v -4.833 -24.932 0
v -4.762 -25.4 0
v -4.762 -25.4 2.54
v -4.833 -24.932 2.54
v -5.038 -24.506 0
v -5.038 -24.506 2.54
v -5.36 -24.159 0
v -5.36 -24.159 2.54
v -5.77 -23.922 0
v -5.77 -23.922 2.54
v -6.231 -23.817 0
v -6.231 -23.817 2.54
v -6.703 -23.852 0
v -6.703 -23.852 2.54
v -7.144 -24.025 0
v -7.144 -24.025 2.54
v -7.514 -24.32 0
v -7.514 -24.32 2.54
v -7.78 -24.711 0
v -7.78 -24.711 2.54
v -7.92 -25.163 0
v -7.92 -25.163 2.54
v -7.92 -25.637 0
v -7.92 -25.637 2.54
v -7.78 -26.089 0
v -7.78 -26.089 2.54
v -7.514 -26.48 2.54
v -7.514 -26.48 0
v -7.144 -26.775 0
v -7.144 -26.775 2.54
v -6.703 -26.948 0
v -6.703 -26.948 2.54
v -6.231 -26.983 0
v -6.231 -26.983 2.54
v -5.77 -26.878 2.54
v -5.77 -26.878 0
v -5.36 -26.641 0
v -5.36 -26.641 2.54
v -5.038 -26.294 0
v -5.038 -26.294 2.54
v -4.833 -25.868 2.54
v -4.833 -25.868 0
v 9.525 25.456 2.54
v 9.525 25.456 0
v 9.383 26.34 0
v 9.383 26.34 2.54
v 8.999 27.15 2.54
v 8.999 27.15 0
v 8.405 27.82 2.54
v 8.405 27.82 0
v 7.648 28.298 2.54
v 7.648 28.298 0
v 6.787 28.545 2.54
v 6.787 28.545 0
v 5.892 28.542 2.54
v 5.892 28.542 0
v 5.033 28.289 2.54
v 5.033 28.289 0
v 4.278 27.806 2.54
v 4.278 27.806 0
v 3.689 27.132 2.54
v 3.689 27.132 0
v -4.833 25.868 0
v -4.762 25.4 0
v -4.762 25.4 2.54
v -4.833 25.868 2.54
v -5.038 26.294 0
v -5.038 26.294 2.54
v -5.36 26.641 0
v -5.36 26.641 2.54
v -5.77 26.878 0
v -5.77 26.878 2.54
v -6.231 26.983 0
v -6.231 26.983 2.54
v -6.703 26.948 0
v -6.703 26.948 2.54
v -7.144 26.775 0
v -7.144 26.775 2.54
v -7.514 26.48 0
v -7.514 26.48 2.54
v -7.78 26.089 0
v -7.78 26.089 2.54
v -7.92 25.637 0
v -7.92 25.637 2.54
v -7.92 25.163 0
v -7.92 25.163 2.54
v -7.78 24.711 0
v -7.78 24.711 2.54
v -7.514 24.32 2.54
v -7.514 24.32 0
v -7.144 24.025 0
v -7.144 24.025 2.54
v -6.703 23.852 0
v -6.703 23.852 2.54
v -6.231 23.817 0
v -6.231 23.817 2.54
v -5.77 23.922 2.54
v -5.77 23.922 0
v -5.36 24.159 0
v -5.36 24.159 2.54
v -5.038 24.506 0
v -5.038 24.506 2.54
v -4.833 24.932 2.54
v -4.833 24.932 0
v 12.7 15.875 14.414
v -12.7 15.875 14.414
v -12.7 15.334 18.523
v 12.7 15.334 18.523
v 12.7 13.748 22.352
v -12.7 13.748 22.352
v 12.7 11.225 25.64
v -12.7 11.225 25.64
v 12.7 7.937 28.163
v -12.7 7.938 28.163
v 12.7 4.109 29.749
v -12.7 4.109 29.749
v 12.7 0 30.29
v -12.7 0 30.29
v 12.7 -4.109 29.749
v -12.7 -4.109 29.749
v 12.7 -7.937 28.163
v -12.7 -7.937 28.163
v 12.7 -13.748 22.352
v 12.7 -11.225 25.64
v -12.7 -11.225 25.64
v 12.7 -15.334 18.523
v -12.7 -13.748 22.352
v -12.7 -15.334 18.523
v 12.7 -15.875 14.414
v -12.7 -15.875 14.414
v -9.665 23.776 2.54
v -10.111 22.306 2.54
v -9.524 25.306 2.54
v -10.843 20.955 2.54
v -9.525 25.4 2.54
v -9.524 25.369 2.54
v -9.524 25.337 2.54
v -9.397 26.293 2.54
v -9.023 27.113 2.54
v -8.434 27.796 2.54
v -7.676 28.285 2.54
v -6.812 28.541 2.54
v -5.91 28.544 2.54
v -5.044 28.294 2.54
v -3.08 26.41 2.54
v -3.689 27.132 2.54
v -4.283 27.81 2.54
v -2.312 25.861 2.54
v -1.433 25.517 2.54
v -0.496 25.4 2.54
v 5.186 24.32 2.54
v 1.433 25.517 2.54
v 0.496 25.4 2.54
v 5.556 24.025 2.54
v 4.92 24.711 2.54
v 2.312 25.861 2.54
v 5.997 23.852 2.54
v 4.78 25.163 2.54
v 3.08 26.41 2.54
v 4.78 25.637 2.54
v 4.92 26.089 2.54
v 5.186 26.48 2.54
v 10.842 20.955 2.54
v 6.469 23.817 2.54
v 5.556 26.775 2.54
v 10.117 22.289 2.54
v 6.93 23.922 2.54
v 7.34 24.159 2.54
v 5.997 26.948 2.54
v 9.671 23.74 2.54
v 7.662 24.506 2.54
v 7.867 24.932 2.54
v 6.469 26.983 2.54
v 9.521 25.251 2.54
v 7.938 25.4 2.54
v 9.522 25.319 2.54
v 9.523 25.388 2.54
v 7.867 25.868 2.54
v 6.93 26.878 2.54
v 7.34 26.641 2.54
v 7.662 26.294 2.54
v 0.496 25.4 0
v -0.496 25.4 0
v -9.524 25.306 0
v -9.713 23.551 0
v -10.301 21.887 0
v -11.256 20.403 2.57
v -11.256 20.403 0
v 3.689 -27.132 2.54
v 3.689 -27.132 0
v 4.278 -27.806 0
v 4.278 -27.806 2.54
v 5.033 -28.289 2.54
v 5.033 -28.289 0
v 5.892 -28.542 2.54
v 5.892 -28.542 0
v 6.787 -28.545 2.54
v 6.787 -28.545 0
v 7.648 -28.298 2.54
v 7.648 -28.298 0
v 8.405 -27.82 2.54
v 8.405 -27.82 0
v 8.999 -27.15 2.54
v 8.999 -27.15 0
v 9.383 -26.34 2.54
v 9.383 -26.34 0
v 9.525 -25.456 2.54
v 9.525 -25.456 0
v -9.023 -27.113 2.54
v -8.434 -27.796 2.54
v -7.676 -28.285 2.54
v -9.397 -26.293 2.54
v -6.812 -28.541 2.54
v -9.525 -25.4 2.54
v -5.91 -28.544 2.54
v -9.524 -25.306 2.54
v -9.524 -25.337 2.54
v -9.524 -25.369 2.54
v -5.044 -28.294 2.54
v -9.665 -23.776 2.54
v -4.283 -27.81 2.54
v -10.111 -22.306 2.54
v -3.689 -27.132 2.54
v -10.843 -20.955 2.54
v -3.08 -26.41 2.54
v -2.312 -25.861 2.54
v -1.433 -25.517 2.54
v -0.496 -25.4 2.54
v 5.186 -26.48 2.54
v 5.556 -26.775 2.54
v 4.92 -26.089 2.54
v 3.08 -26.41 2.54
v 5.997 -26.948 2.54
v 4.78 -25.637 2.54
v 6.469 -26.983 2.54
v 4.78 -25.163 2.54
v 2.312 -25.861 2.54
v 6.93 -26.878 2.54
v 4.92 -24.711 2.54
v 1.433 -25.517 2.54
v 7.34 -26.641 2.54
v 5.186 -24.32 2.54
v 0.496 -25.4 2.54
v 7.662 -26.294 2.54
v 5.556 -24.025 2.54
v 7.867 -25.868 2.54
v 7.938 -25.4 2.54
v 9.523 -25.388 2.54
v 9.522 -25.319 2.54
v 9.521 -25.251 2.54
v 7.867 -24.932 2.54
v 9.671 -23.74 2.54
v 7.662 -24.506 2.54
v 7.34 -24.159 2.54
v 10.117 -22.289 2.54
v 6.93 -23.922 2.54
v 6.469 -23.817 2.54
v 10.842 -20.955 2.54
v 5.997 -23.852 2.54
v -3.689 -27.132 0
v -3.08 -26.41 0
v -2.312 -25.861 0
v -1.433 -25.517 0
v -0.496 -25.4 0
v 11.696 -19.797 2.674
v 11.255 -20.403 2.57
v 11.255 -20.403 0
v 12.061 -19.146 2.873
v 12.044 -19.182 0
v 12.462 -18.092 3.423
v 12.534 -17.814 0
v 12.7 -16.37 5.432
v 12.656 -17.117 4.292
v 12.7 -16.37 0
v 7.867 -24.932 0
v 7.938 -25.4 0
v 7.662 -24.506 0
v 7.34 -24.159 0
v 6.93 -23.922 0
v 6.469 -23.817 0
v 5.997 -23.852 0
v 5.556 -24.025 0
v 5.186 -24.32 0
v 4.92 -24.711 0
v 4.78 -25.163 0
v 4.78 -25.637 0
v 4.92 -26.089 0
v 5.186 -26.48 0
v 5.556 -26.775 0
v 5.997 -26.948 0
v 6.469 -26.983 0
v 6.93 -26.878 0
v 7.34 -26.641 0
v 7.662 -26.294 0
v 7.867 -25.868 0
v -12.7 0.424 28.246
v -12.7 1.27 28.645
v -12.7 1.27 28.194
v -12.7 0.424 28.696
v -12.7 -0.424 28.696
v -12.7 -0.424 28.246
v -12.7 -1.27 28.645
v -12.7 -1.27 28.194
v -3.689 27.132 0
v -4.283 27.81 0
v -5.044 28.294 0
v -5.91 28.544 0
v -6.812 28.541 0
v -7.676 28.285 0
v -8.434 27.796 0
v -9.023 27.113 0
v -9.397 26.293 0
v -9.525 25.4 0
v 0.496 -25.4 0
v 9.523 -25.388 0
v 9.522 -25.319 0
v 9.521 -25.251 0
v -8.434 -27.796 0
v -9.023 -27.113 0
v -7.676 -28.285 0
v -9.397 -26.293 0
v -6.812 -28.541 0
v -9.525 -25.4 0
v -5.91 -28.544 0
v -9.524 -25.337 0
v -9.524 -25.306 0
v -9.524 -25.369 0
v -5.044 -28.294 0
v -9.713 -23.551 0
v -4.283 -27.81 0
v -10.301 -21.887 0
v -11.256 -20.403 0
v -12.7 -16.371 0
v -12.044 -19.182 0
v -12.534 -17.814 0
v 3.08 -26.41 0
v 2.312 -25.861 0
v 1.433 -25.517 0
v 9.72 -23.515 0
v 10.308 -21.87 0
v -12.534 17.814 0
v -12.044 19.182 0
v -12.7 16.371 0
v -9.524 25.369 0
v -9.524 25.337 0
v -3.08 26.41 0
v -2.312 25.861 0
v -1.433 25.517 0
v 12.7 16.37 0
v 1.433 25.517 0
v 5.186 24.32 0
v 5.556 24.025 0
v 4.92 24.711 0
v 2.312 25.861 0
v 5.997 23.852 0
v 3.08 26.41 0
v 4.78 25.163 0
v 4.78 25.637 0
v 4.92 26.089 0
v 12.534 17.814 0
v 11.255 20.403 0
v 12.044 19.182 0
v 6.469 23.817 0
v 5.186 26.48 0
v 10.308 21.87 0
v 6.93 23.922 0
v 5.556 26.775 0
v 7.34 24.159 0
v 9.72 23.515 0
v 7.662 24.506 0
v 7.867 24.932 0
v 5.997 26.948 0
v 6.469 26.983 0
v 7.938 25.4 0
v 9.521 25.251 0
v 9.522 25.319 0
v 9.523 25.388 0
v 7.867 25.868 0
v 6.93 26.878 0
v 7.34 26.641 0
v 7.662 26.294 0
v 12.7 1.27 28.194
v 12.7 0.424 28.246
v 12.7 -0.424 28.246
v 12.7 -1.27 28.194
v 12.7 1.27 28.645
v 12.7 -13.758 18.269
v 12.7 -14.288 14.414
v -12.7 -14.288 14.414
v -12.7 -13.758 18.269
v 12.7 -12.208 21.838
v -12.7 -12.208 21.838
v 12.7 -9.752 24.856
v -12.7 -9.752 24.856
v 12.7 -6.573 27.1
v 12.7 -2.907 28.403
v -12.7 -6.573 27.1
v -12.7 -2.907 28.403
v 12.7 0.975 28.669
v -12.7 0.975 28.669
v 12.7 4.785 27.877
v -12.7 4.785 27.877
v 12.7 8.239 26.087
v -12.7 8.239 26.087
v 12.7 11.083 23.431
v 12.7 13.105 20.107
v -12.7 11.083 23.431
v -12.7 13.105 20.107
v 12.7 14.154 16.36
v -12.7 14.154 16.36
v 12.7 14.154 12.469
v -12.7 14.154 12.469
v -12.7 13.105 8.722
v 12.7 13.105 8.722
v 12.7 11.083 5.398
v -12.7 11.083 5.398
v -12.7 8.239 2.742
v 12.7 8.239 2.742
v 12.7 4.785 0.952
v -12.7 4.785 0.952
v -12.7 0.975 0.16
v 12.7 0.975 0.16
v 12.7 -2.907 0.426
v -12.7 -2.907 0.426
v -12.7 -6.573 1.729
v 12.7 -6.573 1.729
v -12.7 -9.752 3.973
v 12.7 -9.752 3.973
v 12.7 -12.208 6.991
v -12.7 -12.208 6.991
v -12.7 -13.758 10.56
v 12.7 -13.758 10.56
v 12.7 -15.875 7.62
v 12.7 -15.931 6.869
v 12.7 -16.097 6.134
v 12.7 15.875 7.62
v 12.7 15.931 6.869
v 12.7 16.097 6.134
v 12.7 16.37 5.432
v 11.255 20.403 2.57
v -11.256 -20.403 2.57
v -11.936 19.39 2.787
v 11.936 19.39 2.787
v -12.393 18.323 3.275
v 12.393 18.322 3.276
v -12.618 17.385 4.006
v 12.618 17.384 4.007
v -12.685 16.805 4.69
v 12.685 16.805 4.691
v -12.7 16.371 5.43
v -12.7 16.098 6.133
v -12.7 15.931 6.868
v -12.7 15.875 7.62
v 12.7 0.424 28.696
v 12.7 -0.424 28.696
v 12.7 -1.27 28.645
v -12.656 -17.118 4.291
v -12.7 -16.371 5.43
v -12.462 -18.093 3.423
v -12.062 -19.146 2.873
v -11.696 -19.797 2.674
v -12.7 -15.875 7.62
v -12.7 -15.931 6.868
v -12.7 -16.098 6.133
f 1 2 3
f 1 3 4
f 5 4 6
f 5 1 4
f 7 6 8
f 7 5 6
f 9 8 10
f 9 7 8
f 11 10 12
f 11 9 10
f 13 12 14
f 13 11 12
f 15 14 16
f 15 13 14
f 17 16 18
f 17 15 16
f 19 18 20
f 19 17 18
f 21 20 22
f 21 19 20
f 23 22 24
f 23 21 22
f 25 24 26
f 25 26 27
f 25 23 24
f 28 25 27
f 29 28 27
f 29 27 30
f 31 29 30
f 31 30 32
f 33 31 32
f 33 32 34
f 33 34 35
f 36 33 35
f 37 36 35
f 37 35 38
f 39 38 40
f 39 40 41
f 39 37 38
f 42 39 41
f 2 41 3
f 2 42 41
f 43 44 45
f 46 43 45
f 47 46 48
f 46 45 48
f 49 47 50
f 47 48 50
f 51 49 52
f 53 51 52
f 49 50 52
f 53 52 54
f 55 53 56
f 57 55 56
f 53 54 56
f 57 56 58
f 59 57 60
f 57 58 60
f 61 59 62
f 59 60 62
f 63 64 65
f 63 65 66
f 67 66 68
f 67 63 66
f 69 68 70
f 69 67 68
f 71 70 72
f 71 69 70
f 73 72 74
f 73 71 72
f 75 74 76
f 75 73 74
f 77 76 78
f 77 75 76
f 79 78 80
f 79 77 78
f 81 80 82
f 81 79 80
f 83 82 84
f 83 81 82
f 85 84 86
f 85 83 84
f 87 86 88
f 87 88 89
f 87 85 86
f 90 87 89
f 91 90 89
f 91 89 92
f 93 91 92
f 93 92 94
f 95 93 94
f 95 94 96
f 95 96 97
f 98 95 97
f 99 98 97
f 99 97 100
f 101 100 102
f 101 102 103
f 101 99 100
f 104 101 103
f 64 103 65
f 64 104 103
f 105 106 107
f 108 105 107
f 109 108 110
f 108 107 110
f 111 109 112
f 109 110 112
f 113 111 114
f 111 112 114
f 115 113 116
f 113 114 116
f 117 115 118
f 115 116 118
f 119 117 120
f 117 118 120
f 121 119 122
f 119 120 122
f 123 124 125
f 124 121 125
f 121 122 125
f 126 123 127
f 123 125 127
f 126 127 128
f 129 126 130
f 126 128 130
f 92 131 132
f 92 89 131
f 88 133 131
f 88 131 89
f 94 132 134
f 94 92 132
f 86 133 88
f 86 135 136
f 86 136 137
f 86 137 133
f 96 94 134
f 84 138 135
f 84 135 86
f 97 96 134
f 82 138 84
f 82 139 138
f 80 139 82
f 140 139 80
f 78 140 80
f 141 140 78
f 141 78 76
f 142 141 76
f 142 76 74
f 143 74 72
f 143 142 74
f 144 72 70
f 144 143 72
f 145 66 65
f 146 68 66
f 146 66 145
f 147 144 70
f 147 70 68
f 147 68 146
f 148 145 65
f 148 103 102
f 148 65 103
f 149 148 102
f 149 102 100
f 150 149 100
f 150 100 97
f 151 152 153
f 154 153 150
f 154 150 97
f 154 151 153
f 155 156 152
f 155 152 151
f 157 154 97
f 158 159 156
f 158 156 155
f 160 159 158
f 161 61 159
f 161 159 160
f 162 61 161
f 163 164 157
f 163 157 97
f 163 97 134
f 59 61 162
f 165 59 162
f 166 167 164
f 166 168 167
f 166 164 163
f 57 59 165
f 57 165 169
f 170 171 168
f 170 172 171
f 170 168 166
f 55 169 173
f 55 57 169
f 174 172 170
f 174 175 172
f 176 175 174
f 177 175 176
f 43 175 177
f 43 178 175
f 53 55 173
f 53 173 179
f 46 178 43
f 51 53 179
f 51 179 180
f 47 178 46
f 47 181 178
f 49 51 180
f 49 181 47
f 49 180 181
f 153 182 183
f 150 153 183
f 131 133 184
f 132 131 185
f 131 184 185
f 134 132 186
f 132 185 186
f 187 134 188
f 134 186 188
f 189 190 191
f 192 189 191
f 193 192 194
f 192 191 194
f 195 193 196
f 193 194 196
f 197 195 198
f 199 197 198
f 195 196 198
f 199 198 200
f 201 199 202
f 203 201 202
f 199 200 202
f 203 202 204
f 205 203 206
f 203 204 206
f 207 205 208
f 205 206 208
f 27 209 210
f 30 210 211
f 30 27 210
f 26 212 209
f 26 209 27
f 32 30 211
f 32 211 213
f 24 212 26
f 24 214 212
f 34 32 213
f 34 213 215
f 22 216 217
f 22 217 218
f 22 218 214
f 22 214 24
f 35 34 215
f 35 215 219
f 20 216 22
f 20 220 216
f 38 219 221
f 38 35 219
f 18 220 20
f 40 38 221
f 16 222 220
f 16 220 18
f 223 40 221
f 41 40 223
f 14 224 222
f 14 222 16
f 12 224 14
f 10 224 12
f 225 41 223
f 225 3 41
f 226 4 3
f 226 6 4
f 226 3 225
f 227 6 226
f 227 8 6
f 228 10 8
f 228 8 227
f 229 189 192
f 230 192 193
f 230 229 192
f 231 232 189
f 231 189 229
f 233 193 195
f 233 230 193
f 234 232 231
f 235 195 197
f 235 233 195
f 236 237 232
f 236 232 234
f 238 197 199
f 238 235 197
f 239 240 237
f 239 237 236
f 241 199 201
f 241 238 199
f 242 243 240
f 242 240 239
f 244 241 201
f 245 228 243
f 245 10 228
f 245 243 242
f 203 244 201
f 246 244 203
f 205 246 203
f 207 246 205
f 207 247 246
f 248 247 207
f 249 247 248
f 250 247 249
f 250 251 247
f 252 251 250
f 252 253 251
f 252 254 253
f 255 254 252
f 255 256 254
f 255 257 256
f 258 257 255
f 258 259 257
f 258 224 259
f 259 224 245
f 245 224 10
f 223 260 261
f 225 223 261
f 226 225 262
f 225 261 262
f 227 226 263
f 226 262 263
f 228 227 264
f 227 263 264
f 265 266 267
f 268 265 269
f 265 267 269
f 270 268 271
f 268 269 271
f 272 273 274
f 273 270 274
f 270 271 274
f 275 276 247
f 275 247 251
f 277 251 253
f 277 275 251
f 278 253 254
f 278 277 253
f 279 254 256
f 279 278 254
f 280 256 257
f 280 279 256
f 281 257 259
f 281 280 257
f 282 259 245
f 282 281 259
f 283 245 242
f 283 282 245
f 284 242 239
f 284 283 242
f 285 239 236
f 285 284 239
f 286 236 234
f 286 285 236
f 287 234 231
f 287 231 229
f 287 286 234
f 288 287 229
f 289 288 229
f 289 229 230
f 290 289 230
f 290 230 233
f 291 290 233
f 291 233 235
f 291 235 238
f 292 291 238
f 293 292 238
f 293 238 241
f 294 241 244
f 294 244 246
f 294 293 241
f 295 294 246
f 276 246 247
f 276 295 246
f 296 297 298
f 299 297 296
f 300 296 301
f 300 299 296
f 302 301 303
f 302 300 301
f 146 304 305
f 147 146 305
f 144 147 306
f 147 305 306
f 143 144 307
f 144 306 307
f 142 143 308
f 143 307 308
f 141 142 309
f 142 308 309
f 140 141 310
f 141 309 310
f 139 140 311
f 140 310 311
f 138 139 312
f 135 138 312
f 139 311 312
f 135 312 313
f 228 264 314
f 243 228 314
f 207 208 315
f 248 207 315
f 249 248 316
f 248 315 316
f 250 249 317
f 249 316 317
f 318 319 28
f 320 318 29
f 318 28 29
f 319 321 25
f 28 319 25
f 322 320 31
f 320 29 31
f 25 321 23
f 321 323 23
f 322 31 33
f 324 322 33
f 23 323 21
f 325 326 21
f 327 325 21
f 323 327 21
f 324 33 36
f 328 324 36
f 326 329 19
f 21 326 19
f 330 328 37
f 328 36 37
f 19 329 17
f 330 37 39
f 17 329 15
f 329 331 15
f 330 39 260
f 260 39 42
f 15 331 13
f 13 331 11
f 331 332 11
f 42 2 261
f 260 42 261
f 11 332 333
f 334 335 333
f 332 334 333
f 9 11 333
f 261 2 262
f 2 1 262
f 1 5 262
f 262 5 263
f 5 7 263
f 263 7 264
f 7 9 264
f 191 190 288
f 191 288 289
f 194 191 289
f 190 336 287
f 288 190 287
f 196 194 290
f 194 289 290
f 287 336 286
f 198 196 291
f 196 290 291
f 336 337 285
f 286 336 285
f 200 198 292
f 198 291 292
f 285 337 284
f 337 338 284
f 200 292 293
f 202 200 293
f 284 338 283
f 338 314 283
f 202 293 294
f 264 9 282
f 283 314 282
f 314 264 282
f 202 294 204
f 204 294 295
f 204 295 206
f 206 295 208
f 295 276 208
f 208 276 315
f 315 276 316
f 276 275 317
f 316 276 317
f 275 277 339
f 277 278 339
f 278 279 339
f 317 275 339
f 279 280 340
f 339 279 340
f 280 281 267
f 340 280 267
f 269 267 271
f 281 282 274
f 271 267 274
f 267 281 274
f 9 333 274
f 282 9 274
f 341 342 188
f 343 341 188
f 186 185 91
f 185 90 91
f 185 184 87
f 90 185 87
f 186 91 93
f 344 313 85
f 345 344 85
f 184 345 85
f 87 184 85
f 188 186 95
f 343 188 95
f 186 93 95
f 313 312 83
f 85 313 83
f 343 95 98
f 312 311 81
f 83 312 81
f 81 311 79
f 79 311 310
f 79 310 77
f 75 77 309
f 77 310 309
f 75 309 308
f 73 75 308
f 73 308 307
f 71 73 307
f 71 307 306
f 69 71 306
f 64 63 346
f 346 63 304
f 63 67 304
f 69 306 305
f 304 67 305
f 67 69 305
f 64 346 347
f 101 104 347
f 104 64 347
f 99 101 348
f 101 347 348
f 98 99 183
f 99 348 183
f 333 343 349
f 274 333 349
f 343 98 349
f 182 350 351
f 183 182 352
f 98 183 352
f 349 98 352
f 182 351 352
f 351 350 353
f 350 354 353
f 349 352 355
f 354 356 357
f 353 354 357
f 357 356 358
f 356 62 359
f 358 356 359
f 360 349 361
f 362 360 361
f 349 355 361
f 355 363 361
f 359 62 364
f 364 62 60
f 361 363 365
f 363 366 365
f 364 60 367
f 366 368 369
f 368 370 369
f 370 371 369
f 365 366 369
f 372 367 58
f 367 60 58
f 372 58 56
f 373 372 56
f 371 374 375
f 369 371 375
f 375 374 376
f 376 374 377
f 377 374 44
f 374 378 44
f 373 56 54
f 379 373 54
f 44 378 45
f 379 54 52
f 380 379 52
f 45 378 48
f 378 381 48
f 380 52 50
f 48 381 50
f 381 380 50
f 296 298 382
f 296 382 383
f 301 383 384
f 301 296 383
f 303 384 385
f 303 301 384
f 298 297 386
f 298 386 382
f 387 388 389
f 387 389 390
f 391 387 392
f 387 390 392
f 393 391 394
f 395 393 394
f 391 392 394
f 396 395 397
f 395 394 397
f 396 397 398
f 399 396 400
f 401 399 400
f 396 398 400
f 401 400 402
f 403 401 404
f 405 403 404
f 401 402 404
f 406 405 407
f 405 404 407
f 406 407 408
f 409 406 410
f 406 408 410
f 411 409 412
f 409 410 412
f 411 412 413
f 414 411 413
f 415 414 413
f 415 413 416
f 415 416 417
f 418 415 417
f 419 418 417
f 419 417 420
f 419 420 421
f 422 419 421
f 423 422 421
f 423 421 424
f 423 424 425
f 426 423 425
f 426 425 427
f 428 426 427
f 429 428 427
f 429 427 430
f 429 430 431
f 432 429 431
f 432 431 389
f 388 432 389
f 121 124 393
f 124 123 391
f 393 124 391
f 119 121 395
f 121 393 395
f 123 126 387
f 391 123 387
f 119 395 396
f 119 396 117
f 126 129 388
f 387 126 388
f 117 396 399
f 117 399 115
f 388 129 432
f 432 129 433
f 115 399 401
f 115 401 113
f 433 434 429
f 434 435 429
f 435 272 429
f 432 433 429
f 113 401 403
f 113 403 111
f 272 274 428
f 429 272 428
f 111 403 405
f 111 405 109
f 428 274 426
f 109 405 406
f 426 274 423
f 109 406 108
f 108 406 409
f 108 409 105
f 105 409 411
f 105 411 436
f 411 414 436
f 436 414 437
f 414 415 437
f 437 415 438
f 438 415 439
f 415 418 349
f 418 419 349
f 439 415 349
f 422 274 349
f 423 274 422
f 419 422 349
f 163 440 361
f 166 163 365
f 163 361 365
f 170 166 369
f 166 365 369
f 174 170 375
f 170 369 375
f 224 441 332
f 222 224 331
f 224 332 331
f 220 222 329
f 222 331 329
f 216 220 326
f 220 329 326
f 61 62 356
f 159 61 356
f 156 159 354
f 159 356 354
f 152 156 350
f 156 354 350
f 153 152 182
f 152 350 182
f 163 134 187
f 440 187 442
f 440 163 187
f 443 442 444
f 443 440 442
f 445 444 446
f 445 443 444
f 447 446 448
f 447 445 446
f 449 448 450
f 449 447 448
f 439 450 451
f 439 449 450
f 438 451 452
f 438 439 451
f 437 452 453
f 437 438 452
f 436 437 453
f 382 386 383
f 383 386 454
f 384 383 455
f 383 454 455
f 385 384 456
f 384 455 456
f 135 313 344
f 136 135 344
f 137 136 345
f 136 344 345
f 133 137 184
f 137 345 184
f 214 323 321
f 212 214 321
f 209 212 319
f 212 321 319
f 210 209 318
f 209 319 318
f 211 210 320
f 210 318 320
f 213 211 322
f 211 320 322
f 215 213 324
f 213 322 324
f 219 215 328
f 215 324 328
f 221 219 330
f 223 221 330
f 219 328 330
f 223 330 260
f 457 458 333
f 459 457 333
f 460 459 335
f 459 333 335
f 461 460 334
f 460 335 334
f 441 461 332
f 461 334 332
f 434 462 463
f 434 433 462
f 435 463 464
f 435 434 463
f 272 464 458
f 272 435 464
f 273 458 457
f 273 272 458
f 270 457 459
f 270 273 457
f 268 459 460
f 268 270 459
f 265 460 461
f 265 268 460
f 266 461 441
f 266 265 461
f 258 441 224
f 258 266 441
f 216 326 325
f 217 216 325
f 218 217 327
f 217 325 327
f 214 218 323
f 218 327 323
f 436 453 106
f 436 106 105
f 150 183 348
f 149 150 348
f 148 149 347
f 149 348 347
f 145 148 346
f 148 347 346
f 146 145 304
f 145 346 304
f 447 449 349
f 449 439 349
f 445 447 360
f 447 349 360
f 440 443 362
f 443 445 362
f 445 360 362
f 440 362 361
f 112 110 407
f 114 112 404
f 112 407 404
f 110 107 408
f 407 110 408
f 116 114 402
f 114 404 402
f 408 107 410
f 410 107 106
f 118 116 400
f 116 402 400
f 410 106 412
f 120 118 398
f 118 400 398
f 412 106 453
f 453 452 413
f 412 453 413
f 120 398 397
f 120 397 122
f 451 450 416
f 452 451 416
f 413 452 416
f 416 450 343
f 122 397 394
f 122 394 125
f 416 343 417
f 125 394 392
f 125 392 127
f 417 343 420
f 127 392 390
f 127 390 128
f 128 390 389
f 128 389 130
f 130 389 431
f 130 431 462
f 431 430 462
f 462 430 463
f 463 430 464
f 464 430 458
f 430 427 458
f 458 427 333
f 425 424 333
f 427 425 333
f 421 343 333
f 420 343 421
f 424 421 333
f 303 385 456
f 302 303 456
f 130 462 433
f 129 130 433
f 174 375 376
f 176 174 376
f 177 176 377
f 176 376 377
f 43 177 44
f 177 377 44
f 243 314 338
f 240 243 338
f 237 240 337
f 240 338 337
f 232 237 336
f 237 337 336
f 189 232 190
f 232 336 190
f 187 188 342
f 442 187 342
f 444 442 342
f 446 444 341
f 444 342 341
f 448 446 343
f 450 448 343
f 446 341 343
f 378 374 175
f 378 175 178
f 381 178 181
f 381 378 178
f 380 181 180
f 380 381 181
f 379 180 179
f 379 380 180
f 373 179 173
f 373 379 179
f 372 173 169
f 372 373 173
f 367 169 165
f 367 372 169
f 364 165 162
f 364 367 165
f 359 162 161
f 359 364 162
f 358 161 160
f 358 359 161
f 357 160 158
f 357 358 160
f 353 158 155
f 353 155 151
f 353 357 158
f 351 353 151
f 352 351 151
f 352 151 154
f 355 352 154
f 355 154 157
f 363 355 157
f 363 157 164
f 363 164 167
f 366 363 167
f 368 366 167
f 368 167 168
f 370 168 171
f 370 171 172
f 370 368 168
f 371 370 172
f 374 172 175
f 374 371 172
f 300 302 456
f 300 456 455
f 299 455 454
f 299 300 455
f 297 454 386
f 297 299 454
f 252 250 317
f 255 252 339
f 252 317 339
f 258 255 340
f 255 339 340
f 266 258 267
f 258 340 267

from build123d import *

# Parameters (mm, degrees)
F0_R     = 1.5875
F1_DEPTH = 2.54
F2_W     = 25.4
F2_H     = 31.75
F3_DEPTH = 31.75
F4_R     = 14.2875
F5_DEPTH = 53.3654
F6_R     = 5.08
F8_DEPTH = 25.4


with BuildPart() as f1:
    # F0 (on Top) → F1 (new body)
    with BuildSketch(Plane.XY):
        with BuildLine():
            Line((0, 0), (12.7, 0))
            Line((12.7, 0), (12.7, 16.370167))
            ThreePointArc((12.7, 16.370167), (12.327903, 18.511936), (11.25522, 20.402699))
            ThreePointArc((11.25522, 20.402699), (9.966485, 22.67585), (9.521489, 25.250735))
            ThreePointArc((9.521489, 25.250735), (9.522303, 25.353477), (9.524503, 25.456199))
            ThreePointArc((9.524503, 25.456199), (7.226254, 28.451689), (3.688904, 27.131818))
            ThreePointArc((3.688904, 27.131818), (2.311936, 25.860823), (0.495589, 25.4))
            Line((0.495589, 25.4), (-0.495589, 25.4))
            ThreePointArc((-0.495589, 25.4), (-2.311936, 25.860823), (-3.688904, 27.131818))
            ThreePointArc((-3.688904, 27.131818), (-7.253229, 28.443814), (-9.525, 25.4))
            ThreePointArc((-9.525, 25.4), (-9.524161, 25.353068), (-9.523612, 25.306132))
            ThreePointArc((-9.523612, 25.306132), (-9.958565, 22.701996), (-11.256059, 20.4026))
            ThreePointArc((-11.256059, 20.4026), (-12.328126, 18.512236), (-12.7, 16.371088))
            Line((-12.7, 16.371088), (-12.7, 0))
            Line((-12.7, 0), (0, 0))
        make_face()
        with Locations((-6.35, 25.4)):
            Circle(F0_R, mode=Mode.SUBTRACT)
        with Locations((6.35, 25.4)):
            Circle(F0_R, mode=Mode.SUBTRACT)
        with BuildLine():
            Line((12.7, -16.370167), (12.7, 0))
            Line((12.7, 0), (0, 0))
            Line((0, 0), (-12.7, 0))
            Line((-12.7, 0), (-12.7, -16.371088))
            ThreePointArc((-12.7, -16.371088), (-12.328126, -18.512236), (-11.256059, -20.4026))
            ThreePointArc((-11.256059, -20.4026), (-9.958565, -22.701996), (-9.523612, -25.306132))
            ThreePointArc((-9.523612, -25.306132), (-9.524161, -25.353068), (-9.525, -25.4))
            ThreePointArc((-9.525, -25.4), (-7.253229, -28.443814), (-3.688904, -27.131818))
            ThreePointArc((-3.688904, -27.131818), (-2.311936, -25.860823), (-0.495589, -25.4))
            Line((-0.495589, -25.4), (0.495589, -25.4))
            ThreePointArc((0.495589, -25.4), (2.311936, -25.860823), (3.688904, -27.131818))
            ThreePointArc((3.688904, -27.131818), (7.226254, -28.451689), (9.524503, -25.456199))
            ThreePointArc((9.524503, -25.456199), (9.522303, -25.353477), (9.521489, -25.250735))
            ThreePointArc((9.521489, -25.250735), (9.966485, -22.67585), (11.25522, -20.402699))
            ThreePointArc((11.25522, -20.402699), (12.327903, -18.511936), (12.7, -16.370167))
        make_face()
        with Locations((-6.35, -25.4)):
            Circle(F0_R, mode=Mode.SUBTRACT)
        with Locations((6.35, -25.4)):
            Circle(F0_R, mode=Mode.SUBTRACT)
    extrude(amount=F1_DEPTH)

    # F2 (on face) → F3 (join)
    with BuildSketch(Plane.XY.offset(2.54)):
        Rectangle(F2_W, F2_H)
    extrude(amount=F3_DEPTH)

    # F4 (on face) → F5 (cut)
    with BuildSketch(Plane(origin=(-12.7, 0, 0), x_dir=(0, -1, 0), z_dir=(-1, 0, 0))):
        with BuildLine():
            ThreePointArc((-15.875, 14.4145), (0, 30.2895), (15.875, 14.4145))
            Line((15.875, 14.4145), (15.875, 34.29))
            Line((15.875, 34.29), (-15.875, 34.29))
            Line((-15.875, 34.29), (-15.875, 14.4145))
        make_face()
        with Locations((0, 14.4145)):
            Circle(F4_R)
    extrude(amount=-F5_DEPTH, mode=Mode.SUBTRACT)

    # F6
    f6_edges = [f1.edges().sort_by_distance(p)[0] for p in [
        (0, -15.875, 2.54),
        (0, 15.875, 2.54),
    ]]
    fillet(f6_edges, radius=F6_R)


with BuildPart() as f8:
    # F7 (on face) → F8 (new body)
    with BuildSketch(Plane(origin=(-12.7, 0, 0), x_dir=(0, -1, 0), z_dir=(-1, 0, 0))):
        with BuildLine():
            Line((1.27, 28.194), (1.27, 28.645444))
            ThreePointArc((1.27, 28.645444), (0, 28.702), (-1.27, 28.645444))
            Line((-1.27, 28.645444), (-1.27, 28.194))
            ThreePointArc((-1.27, 28.194), (0, 28.252402), (1.27, 28.194))
        make_face()
    extrude(amount=-F8_DEPTH)


solid = Compound([f1.part, f8.part])
